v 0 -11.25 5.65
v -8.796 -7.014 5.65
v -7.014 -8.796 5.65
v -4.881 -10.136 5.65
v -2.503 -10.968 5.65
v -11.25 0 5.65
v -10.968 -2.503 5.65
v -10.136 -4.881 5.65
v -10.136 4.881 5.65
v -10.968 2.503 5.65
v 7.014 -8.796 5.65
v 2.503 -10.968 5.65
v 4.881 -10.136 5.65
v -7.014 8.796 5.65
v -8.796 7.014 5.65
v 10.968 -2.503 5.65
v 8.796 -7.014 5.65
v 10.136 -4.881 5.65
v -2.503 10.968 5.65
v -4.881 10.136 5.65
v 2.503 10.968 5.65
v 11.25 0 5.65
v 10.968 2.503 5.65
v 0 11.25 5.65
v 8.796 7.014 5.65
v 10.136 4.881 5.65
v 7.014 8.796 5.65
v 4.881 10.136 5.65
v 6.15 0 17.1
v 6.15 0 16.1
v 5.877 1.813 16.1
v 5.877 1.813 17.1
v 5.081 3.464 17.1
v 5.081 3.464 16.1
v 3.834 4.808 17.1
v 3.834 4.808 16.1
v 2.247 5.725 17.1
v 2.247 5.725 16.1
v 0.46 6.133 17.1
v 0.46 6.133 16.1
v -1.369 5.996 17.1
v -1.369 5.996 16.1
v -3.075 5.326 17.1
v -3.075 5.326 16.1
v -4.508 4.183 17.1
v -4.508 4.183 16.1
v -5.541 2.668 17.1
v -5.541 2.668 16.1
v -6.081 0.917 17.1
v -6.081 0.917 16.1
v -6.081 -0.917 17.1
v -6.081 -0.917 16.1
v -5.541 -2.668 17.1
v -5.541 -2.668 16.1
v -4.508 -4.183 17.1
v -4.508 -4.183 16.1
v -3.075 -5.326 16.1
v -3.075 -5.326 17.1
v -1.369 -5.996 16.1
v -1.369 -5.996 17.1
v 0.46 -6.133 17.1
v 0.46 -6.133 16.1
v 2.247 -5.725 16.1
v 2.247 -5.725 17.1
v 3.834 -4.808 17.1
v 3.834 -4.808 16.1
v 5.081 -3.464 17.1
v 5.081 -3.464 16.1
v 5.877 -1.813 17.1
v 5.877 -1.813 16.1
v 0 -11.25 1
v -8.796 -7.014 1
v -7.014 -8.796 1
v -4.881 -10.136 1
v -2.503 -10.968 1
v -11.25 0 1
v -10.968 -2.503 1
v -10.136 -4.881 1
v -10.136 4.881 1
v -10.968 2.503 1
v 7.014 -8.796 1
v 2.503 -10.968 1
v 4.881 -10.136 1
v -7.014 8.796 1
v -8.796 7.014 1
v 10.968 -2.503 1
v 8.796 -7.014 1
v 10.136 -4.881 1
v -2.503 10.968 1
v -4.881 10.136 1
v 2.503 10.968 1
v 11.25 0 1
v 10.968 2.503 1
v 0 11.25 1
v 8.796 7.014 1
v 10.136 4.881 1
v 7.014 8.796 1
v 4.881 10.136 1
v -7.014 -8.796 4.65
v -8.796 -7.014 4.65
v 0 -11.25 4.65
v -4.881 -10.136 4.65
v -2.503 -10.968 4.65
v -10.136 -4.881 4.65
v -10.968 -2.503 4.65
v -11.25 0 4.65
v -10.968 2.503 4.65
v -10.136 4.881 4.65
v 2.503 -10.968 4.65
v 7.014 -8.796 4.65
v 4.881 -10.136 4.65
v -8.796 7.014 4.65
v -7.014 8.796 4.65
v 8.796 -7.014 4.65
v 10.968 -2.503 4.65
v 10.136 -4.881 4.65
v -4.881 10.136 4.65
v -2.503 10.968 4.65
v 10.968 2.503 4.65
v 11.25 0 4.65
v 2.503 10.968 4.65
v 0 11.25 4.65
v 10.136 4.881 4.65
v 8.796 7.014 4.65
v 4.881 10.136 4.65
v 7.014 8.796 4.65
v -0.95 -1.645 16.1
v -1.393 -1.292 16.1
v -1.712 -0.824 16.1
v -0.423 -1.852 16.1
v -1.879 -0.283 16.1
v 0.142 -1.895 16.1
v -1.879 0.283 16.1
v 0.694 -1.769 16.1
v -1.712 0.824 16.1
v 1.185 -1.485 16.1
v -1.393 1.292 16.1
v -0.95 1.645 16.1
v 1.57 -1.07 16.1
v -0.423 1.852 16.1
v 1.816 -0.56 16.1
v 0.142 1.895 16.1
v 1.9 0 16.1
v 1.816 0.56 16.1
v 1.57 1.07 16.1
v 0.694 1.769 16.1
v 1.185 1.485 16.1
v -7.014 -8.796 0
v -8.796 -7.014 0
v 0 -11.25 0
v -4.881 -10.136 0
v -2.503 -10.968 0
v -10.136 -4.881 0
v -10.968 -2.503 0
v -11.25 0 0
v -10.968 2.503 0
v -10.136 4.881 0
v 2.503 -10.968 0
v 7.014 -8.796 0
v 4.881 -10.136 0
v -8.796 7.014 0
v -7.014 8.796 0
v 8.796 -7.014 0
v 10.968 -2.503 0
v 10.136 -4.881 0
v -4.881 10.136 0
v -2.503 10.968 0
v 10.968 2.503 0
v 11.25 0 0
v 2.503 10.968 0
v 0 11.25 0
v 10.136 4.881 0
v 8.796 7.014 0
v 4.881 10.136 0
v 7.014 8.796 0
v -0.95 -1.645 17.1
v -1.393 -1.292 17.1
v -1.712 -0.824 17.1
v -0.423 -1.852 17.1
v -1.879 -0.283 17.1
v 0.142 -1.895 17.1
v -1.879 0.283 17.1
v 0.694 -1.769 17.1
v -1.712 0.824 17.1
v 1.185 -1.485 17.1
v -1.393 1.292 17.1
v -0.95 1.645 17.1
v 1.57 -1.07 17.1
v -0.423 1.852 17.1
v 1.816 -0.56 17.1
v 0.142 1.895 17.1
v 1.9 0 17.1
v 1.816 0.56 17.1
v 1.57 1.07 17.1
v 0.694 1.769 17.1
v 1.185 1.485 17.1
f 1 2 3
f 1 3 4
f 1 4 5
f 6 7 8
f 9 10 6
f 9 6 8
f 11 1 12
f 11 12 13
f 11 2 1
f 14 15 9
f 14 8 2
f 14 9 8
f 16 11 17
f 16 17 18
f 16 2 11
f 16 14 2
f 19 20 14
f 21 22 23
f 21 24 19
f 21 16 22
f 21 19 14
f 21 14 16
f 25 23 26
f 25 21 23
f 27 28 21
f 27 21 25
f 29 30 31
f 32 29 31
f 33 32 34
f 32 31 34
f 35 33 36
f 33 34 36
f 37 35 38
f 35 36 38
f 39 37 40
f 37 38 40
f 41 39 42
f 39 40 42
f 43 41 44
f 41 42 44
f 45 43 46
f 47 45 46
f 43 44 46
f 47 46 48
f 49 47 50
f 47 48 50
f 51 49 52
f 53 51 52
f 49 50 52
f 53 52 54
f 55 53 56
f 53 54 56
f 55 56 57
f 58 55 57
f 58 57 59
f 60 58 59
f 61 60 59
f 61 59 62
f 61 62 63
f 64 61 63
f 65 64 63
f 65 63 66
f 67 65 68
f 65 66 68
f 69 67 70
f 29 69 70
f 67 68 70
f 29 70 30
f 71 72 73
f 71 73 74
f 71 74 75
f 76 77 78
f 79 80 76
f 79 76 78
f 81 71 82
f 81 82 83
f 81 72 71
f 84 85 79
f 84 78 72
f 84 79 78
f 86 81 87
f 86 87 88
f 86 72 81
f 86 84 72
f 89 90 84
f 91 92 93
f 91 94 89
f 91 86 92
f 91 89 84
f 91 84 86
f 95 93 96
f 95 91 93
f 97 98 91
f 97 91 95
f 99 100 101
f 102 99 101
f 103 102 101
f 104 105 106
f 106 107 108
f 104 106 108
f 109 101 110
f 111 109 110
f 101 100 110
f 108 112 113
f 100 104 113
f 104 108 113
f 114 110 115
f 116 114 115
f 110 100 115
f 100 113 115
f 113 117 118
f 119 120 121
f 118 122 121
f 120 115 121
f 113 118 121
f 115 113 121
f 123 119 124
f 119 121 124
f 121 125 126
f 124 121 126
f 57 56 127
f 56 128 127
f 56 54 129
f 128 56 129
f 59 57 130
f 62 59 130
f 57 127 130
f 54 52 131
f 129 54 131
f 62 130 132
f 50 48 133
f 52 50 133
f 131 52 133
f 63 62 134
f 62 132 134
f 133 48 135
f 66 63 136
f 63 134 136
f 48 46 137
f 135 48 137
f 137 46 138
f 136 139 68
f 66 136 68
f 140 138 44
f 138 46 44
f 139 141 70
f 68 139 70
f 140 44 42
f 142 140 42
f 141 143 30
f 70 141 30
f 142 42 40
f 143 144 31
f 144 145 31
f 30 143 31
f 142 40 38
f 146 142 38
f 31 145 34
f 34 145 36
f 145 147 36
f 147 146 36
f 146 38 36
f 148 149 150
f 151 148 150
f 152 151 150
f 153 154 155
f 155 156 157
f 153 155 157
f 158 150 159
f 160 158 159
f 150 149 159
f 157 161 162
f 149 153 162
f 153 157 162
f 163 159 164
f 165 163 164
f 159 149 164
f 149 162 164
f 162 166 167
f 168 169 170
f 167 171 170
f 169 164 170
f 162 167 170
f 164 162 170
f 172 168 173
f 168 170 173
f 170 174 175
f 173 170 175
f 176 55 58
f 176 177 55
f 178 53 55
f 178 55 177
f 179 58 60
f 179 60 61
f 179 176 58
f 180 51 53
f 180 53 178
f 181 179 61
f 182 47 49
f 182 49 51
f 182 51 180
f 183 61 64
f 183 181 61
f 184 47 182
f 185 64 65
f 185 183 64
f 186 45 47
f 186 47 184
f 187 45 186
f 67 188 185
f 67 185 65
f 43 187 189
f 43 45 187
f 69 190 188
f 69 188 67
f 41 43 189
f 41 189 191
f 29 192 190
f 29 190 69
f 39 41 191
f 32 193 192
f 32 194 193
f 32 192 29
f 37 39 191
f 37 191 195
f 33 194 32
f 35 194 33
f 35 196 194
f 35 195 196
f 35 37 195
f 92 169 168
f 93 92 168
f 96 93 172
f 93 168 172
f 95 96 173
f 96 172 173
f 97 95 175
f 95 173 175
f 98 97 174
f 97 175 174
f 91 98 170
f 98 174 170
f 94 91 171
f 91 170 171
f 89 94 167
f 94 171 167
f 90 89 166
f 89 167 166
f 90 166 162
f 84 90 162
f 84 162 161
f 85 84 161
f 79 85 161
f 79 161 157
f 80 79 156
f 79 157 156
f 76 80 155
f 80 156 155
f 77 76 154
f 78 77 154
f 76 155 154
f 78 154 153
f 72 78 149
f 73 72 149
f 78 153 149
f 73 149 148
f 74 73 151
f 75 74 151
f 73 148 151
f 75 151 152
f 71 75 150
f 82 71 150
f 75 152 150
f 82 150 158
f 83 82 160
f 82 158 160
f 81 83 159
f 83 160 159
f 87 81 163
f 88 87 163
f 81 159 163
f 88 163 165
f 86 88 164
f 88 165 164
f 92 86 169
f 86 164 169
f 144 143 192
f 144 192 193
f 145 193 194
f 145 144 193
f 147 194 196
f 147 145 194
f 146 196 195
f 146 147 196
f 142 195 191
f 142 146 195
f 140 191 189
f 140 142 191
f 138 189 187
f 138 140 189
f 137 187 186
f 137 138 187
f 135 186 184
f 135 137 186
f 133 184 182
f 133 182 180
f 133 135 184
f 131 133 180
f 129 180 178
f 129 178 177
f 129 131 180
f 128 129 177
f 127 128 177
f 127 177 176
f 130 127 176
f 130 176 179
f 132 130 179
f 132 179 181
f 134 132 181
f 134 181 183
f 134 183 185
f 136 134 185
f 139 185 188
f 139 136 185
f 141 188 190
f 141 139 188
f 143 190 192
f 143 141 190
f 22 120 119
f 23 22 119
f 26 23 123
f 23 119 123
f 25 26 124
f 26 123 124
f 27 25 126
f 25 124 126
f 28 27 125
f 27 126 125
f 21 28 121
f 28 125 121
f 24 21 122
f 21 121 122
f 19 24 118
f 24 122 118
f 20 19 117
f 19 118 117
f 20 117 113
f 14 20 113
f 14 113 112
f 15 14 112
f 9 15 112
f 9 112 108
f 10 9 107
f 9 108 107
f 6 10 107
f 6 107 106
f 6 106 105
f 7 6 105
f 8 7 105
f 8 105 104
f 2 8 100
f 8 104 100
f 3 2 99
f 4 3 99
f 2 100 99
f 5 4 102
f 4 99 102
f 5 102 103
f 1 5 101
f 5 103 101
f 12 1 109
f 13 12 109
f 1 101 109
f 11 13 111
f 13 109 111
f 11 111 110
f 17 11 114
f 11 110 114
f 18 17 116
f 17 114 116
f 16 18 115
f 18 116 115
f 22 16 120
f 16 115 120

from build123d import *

# Parameters (mm, degrees)
F0_R     = 11.25
F1_DEPTH = 1
F3_R     = 11.25
F4_DEPTH = 1
F6_R     = 6.15
F6_R_2   = 1.9
F7_DEPTH = 1


with BuildPart() as f1:
    # F0 (on Top) → F1 (new body)
    with BuildSketch(Plane.XY):
        Circle(F0_R)
    extrude(amount=F1_DEPTH)


with BuildPart() as f4:
    # F3 (on offset) → F4 (new body)
    with BuildSketch(Plane.XY.offset(4.65)):
        Circle(F3_R)
    extrude(amount=F4_DEPTH)


with BuildPart() as f7:
    # F6 (on offset) → F7 (new body)
    with BuildSketch(Plane.XY.offset(16.1)):
        Circle(F6_R)
        Circle(F6_R_2, mode=Mode.SUBTRACT)
    extrude(amount=F7_DEPTH)


solid = Compound([f1.part, f4.part, f7.part])
